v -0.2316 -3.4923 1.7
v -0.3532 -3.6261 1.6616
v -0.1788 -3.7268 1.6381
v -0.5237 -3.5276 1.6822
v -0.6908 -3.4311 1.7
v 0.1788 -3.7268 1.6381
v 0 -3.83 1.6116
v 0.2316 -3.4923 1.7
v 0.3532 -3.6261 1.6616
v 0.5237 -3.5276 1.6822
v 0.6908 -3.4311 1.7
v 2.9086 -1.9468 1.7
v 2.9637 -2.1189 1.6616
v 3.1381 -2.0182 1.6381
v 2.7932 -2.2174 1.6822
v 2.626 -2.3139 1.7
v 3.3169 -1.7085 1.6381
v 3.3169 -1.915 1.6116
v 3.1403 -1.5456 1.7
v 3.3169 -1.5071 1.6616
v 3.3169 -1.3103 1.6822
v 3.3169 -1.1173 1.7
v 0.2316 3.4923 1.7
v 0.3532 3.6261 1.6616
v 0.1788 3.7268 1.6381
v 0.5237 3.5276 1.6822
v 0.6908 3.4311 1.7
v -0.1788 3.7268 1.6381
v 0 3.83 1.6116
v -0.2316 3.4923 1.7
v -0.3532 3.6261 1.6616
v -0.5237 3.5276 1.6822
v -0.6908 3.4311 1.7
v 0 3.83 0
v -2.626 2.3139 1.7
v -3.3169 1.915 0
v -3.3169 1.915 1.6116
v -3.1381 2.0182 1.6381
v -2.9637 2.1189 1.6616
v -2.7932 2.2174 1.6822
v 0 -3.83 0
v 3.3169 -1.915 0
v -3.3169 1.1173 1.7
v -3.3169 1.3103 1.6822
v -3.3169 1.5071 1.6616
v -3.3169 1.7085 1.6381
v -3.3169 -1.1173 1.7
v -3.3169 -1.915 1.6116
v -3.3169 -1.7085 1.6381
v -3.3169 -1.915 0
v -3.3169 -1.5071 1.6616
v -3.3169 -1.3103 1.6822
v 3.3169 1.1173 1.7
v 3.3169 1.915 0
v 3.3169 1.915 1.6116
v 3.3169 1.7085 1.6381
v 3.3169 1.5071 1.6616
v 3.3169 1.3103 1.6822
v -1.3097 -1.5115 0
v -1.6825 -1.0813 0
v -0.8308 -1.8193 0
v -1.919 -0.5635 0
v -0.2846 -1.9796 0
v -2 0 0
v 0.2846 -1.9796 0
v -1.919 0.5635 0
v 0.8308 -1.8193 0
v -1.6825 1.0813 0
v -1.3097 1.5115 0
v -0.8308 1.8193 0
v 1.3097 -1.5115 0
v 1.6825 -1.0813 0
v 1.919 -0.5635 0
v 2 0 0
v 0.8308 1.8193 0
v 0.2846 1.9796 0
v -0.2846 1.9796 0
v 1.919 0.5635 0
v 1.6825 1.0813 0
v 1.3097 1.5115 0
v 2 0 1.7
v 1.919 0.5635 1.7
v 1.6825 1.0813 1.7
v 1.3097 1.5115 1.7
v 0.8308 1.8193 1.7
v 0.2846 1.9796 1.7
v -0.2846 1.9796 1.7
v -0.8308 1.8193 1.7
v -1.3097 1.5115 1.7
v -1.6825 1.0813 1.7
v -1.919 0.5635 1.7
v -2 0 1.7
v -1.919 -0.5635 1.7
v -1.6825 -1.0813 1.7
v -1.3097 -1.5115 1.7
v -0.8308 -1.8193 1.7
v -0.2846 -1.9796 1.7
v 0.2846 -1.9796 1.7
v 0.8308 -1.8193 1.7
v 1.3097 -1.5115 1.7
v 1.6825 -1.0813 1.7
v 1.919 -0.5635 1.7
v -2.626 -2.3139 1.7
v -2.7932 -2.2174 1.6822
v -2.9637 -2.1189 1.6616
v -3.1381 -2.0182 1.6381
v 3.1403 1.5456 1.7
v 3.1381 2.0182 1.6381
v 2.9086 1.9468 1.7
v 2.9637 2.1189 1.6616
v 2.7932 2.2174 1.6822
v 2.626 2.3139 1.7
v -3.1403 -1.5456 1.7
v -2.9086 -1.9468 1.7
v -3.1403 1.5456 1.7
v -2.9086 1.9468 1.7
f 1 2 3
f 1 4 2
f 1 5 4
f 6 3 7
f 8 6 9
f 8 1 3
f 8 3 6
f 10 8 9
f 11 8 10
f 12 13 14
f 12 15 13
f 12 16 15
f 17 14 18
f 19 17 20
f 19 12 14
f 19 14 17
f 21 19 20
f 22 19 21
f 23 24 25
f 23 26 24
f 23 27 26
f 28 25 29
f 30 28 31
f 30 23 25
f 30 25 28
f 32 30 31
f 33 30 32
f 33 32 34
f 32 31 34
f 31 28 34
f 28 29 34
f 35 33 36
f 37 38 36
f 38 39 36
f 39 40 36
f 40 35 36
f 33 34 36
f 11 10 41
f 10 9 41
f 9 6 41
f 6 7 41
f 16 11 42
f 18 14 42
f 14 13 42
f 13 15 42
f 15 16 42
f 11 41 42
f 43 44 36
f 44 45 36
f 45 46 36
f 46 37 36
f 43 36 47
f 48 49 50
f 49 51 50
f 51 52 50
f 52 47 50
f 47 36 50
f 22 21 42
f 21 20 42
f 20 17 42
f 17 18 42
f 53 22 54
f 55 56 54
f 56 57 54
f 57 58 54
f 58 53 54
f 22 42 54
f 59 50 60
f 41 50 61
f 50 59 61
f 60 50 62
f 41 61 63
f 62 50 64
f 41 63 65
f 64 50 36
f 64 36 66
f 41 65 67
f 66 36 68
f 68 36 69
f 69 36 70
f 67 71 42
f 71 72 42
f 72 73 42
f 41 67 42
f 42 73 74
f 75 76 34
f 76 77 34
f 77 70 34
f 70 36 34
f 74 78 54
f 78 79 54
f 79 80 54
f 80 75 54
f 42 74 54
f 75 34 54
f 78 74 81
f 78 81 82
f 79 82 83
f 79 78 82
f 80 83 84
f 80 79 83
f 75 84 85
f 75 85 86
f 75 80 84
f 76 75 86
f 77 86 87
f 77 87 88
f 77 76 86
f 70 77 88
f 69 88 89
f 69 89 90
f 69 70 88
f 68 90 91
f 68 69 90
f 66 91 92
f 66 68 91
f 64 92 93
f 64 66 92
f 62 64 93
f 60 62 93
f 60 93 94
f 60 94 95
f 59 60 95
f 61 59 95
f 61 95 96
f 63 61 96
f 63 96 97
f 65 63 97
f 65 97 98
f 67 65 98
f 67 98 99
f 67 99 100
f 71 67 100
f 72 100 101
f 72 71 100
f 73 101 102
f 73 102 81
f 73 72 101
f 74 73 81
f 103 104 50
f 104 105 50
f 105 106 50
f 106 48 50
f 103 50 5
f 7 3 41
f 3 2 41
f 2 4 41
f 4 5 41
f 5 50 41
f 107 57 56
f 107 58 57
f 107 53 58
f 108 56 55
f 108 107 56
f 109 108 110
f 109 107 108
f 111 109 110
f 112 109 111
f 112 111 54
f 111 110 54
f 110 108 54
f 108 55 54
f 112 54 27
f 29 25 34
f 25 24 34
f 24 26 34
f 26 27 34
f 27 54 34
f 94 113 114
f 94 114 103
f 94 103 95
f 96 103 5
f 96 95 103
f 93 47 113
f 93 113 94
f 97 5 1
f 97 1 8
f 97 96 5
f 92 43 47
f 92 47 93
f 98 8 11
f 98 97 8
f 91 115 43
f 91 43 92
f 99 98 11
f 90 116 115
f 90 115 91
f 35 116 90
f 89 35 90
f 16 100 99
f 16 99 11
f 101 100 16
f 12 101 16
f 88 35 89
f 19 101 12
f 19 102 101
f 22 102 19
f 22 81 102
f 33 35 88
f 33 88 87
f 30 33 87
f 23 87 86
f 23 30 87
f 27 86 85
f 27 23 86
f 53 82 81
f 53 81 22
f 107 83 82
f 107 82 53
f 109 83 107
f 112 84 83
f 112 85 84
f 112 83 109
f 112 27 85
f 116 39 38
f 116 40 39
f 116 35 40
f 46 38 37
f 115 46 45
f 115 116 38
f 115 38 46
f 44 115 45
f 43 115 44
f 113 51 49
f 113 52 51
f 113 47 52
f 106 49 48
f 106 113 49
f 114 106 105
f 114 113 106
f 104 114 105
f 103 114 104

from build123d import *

# Parameters (mm, degrees)
SKETCH_1_R          = 2
EXTRUDE_542_DEPTH   = 1.7
SKETCH_2_OUTSIDE_W  = 58.042
SKETCH_2_OUTSIDE_H  = 59.068
SKETCH_2_OUTSIDE_R  = 3.5
CUT_EXTRUDE_1_DEPTH = 6.344209483
CUT_EXTRUDE_1_DRAFT = -75


with BuildPart() as part:
    # 草图1 → Extrude 542 (new body)
    with BuildSketch(Plane.XY):
        Polygon((0, 3.83), (-3.316877296, 1.915), (-3.316877296, -1.915), (0, -3.83), (3.316877296, -1.915), (3.316877296, 1.915), align=None)
        Circle(SKETCH_1_R, mode=Mode.SUBTRACT)
    extrude(amount=EXTRUDE_542_DEPTH)


with BuildPart() as cut_extrude_1_tool:
    # 草图2 outside → 切除-拉伸1 (with draft: the straight prism first)
    with BuildSketch(Plane.XY.offset(1.7)):
        Rectangle(SKETCH_2_OUTSIDE_W, SKETCH_2_OUTSIDE_H)
        Circle(SKETCH_2_OUTSIDE_R, mode=Mode.SUBTRACT)
    extrude(amount=-CUT_EXTRUDE_1_DEPTH)
    # 切除-拉伸1: the draft: its side faces are tilted about the plane it starts from
    cut_extrude_1_sides = [cut_extrude_1_tool.faces().sort_by_distance(p)[0] for p in [
        (0, -29.534, -1.472104742),
        (29.021, 0, -1.472104742),
        (0, 29.534, -1.472104742),
        (-29.021, 0, -1.472104742),
        (-3.5, 0, -1.472104742),
    ]]
    draft(cut_extrude_1_sides, Plane.XY.offset(1.7), CUT_EXTRUDE_1_DRAFT)


with BuildPart() as part_1:
    add(part.part)

    # 切除-拉伸1: cut by cut_extrude_1_tool
    add(cut_extrude_1_tool.part, mode=Mode.SUBTRACT)


solid = part_1.part
